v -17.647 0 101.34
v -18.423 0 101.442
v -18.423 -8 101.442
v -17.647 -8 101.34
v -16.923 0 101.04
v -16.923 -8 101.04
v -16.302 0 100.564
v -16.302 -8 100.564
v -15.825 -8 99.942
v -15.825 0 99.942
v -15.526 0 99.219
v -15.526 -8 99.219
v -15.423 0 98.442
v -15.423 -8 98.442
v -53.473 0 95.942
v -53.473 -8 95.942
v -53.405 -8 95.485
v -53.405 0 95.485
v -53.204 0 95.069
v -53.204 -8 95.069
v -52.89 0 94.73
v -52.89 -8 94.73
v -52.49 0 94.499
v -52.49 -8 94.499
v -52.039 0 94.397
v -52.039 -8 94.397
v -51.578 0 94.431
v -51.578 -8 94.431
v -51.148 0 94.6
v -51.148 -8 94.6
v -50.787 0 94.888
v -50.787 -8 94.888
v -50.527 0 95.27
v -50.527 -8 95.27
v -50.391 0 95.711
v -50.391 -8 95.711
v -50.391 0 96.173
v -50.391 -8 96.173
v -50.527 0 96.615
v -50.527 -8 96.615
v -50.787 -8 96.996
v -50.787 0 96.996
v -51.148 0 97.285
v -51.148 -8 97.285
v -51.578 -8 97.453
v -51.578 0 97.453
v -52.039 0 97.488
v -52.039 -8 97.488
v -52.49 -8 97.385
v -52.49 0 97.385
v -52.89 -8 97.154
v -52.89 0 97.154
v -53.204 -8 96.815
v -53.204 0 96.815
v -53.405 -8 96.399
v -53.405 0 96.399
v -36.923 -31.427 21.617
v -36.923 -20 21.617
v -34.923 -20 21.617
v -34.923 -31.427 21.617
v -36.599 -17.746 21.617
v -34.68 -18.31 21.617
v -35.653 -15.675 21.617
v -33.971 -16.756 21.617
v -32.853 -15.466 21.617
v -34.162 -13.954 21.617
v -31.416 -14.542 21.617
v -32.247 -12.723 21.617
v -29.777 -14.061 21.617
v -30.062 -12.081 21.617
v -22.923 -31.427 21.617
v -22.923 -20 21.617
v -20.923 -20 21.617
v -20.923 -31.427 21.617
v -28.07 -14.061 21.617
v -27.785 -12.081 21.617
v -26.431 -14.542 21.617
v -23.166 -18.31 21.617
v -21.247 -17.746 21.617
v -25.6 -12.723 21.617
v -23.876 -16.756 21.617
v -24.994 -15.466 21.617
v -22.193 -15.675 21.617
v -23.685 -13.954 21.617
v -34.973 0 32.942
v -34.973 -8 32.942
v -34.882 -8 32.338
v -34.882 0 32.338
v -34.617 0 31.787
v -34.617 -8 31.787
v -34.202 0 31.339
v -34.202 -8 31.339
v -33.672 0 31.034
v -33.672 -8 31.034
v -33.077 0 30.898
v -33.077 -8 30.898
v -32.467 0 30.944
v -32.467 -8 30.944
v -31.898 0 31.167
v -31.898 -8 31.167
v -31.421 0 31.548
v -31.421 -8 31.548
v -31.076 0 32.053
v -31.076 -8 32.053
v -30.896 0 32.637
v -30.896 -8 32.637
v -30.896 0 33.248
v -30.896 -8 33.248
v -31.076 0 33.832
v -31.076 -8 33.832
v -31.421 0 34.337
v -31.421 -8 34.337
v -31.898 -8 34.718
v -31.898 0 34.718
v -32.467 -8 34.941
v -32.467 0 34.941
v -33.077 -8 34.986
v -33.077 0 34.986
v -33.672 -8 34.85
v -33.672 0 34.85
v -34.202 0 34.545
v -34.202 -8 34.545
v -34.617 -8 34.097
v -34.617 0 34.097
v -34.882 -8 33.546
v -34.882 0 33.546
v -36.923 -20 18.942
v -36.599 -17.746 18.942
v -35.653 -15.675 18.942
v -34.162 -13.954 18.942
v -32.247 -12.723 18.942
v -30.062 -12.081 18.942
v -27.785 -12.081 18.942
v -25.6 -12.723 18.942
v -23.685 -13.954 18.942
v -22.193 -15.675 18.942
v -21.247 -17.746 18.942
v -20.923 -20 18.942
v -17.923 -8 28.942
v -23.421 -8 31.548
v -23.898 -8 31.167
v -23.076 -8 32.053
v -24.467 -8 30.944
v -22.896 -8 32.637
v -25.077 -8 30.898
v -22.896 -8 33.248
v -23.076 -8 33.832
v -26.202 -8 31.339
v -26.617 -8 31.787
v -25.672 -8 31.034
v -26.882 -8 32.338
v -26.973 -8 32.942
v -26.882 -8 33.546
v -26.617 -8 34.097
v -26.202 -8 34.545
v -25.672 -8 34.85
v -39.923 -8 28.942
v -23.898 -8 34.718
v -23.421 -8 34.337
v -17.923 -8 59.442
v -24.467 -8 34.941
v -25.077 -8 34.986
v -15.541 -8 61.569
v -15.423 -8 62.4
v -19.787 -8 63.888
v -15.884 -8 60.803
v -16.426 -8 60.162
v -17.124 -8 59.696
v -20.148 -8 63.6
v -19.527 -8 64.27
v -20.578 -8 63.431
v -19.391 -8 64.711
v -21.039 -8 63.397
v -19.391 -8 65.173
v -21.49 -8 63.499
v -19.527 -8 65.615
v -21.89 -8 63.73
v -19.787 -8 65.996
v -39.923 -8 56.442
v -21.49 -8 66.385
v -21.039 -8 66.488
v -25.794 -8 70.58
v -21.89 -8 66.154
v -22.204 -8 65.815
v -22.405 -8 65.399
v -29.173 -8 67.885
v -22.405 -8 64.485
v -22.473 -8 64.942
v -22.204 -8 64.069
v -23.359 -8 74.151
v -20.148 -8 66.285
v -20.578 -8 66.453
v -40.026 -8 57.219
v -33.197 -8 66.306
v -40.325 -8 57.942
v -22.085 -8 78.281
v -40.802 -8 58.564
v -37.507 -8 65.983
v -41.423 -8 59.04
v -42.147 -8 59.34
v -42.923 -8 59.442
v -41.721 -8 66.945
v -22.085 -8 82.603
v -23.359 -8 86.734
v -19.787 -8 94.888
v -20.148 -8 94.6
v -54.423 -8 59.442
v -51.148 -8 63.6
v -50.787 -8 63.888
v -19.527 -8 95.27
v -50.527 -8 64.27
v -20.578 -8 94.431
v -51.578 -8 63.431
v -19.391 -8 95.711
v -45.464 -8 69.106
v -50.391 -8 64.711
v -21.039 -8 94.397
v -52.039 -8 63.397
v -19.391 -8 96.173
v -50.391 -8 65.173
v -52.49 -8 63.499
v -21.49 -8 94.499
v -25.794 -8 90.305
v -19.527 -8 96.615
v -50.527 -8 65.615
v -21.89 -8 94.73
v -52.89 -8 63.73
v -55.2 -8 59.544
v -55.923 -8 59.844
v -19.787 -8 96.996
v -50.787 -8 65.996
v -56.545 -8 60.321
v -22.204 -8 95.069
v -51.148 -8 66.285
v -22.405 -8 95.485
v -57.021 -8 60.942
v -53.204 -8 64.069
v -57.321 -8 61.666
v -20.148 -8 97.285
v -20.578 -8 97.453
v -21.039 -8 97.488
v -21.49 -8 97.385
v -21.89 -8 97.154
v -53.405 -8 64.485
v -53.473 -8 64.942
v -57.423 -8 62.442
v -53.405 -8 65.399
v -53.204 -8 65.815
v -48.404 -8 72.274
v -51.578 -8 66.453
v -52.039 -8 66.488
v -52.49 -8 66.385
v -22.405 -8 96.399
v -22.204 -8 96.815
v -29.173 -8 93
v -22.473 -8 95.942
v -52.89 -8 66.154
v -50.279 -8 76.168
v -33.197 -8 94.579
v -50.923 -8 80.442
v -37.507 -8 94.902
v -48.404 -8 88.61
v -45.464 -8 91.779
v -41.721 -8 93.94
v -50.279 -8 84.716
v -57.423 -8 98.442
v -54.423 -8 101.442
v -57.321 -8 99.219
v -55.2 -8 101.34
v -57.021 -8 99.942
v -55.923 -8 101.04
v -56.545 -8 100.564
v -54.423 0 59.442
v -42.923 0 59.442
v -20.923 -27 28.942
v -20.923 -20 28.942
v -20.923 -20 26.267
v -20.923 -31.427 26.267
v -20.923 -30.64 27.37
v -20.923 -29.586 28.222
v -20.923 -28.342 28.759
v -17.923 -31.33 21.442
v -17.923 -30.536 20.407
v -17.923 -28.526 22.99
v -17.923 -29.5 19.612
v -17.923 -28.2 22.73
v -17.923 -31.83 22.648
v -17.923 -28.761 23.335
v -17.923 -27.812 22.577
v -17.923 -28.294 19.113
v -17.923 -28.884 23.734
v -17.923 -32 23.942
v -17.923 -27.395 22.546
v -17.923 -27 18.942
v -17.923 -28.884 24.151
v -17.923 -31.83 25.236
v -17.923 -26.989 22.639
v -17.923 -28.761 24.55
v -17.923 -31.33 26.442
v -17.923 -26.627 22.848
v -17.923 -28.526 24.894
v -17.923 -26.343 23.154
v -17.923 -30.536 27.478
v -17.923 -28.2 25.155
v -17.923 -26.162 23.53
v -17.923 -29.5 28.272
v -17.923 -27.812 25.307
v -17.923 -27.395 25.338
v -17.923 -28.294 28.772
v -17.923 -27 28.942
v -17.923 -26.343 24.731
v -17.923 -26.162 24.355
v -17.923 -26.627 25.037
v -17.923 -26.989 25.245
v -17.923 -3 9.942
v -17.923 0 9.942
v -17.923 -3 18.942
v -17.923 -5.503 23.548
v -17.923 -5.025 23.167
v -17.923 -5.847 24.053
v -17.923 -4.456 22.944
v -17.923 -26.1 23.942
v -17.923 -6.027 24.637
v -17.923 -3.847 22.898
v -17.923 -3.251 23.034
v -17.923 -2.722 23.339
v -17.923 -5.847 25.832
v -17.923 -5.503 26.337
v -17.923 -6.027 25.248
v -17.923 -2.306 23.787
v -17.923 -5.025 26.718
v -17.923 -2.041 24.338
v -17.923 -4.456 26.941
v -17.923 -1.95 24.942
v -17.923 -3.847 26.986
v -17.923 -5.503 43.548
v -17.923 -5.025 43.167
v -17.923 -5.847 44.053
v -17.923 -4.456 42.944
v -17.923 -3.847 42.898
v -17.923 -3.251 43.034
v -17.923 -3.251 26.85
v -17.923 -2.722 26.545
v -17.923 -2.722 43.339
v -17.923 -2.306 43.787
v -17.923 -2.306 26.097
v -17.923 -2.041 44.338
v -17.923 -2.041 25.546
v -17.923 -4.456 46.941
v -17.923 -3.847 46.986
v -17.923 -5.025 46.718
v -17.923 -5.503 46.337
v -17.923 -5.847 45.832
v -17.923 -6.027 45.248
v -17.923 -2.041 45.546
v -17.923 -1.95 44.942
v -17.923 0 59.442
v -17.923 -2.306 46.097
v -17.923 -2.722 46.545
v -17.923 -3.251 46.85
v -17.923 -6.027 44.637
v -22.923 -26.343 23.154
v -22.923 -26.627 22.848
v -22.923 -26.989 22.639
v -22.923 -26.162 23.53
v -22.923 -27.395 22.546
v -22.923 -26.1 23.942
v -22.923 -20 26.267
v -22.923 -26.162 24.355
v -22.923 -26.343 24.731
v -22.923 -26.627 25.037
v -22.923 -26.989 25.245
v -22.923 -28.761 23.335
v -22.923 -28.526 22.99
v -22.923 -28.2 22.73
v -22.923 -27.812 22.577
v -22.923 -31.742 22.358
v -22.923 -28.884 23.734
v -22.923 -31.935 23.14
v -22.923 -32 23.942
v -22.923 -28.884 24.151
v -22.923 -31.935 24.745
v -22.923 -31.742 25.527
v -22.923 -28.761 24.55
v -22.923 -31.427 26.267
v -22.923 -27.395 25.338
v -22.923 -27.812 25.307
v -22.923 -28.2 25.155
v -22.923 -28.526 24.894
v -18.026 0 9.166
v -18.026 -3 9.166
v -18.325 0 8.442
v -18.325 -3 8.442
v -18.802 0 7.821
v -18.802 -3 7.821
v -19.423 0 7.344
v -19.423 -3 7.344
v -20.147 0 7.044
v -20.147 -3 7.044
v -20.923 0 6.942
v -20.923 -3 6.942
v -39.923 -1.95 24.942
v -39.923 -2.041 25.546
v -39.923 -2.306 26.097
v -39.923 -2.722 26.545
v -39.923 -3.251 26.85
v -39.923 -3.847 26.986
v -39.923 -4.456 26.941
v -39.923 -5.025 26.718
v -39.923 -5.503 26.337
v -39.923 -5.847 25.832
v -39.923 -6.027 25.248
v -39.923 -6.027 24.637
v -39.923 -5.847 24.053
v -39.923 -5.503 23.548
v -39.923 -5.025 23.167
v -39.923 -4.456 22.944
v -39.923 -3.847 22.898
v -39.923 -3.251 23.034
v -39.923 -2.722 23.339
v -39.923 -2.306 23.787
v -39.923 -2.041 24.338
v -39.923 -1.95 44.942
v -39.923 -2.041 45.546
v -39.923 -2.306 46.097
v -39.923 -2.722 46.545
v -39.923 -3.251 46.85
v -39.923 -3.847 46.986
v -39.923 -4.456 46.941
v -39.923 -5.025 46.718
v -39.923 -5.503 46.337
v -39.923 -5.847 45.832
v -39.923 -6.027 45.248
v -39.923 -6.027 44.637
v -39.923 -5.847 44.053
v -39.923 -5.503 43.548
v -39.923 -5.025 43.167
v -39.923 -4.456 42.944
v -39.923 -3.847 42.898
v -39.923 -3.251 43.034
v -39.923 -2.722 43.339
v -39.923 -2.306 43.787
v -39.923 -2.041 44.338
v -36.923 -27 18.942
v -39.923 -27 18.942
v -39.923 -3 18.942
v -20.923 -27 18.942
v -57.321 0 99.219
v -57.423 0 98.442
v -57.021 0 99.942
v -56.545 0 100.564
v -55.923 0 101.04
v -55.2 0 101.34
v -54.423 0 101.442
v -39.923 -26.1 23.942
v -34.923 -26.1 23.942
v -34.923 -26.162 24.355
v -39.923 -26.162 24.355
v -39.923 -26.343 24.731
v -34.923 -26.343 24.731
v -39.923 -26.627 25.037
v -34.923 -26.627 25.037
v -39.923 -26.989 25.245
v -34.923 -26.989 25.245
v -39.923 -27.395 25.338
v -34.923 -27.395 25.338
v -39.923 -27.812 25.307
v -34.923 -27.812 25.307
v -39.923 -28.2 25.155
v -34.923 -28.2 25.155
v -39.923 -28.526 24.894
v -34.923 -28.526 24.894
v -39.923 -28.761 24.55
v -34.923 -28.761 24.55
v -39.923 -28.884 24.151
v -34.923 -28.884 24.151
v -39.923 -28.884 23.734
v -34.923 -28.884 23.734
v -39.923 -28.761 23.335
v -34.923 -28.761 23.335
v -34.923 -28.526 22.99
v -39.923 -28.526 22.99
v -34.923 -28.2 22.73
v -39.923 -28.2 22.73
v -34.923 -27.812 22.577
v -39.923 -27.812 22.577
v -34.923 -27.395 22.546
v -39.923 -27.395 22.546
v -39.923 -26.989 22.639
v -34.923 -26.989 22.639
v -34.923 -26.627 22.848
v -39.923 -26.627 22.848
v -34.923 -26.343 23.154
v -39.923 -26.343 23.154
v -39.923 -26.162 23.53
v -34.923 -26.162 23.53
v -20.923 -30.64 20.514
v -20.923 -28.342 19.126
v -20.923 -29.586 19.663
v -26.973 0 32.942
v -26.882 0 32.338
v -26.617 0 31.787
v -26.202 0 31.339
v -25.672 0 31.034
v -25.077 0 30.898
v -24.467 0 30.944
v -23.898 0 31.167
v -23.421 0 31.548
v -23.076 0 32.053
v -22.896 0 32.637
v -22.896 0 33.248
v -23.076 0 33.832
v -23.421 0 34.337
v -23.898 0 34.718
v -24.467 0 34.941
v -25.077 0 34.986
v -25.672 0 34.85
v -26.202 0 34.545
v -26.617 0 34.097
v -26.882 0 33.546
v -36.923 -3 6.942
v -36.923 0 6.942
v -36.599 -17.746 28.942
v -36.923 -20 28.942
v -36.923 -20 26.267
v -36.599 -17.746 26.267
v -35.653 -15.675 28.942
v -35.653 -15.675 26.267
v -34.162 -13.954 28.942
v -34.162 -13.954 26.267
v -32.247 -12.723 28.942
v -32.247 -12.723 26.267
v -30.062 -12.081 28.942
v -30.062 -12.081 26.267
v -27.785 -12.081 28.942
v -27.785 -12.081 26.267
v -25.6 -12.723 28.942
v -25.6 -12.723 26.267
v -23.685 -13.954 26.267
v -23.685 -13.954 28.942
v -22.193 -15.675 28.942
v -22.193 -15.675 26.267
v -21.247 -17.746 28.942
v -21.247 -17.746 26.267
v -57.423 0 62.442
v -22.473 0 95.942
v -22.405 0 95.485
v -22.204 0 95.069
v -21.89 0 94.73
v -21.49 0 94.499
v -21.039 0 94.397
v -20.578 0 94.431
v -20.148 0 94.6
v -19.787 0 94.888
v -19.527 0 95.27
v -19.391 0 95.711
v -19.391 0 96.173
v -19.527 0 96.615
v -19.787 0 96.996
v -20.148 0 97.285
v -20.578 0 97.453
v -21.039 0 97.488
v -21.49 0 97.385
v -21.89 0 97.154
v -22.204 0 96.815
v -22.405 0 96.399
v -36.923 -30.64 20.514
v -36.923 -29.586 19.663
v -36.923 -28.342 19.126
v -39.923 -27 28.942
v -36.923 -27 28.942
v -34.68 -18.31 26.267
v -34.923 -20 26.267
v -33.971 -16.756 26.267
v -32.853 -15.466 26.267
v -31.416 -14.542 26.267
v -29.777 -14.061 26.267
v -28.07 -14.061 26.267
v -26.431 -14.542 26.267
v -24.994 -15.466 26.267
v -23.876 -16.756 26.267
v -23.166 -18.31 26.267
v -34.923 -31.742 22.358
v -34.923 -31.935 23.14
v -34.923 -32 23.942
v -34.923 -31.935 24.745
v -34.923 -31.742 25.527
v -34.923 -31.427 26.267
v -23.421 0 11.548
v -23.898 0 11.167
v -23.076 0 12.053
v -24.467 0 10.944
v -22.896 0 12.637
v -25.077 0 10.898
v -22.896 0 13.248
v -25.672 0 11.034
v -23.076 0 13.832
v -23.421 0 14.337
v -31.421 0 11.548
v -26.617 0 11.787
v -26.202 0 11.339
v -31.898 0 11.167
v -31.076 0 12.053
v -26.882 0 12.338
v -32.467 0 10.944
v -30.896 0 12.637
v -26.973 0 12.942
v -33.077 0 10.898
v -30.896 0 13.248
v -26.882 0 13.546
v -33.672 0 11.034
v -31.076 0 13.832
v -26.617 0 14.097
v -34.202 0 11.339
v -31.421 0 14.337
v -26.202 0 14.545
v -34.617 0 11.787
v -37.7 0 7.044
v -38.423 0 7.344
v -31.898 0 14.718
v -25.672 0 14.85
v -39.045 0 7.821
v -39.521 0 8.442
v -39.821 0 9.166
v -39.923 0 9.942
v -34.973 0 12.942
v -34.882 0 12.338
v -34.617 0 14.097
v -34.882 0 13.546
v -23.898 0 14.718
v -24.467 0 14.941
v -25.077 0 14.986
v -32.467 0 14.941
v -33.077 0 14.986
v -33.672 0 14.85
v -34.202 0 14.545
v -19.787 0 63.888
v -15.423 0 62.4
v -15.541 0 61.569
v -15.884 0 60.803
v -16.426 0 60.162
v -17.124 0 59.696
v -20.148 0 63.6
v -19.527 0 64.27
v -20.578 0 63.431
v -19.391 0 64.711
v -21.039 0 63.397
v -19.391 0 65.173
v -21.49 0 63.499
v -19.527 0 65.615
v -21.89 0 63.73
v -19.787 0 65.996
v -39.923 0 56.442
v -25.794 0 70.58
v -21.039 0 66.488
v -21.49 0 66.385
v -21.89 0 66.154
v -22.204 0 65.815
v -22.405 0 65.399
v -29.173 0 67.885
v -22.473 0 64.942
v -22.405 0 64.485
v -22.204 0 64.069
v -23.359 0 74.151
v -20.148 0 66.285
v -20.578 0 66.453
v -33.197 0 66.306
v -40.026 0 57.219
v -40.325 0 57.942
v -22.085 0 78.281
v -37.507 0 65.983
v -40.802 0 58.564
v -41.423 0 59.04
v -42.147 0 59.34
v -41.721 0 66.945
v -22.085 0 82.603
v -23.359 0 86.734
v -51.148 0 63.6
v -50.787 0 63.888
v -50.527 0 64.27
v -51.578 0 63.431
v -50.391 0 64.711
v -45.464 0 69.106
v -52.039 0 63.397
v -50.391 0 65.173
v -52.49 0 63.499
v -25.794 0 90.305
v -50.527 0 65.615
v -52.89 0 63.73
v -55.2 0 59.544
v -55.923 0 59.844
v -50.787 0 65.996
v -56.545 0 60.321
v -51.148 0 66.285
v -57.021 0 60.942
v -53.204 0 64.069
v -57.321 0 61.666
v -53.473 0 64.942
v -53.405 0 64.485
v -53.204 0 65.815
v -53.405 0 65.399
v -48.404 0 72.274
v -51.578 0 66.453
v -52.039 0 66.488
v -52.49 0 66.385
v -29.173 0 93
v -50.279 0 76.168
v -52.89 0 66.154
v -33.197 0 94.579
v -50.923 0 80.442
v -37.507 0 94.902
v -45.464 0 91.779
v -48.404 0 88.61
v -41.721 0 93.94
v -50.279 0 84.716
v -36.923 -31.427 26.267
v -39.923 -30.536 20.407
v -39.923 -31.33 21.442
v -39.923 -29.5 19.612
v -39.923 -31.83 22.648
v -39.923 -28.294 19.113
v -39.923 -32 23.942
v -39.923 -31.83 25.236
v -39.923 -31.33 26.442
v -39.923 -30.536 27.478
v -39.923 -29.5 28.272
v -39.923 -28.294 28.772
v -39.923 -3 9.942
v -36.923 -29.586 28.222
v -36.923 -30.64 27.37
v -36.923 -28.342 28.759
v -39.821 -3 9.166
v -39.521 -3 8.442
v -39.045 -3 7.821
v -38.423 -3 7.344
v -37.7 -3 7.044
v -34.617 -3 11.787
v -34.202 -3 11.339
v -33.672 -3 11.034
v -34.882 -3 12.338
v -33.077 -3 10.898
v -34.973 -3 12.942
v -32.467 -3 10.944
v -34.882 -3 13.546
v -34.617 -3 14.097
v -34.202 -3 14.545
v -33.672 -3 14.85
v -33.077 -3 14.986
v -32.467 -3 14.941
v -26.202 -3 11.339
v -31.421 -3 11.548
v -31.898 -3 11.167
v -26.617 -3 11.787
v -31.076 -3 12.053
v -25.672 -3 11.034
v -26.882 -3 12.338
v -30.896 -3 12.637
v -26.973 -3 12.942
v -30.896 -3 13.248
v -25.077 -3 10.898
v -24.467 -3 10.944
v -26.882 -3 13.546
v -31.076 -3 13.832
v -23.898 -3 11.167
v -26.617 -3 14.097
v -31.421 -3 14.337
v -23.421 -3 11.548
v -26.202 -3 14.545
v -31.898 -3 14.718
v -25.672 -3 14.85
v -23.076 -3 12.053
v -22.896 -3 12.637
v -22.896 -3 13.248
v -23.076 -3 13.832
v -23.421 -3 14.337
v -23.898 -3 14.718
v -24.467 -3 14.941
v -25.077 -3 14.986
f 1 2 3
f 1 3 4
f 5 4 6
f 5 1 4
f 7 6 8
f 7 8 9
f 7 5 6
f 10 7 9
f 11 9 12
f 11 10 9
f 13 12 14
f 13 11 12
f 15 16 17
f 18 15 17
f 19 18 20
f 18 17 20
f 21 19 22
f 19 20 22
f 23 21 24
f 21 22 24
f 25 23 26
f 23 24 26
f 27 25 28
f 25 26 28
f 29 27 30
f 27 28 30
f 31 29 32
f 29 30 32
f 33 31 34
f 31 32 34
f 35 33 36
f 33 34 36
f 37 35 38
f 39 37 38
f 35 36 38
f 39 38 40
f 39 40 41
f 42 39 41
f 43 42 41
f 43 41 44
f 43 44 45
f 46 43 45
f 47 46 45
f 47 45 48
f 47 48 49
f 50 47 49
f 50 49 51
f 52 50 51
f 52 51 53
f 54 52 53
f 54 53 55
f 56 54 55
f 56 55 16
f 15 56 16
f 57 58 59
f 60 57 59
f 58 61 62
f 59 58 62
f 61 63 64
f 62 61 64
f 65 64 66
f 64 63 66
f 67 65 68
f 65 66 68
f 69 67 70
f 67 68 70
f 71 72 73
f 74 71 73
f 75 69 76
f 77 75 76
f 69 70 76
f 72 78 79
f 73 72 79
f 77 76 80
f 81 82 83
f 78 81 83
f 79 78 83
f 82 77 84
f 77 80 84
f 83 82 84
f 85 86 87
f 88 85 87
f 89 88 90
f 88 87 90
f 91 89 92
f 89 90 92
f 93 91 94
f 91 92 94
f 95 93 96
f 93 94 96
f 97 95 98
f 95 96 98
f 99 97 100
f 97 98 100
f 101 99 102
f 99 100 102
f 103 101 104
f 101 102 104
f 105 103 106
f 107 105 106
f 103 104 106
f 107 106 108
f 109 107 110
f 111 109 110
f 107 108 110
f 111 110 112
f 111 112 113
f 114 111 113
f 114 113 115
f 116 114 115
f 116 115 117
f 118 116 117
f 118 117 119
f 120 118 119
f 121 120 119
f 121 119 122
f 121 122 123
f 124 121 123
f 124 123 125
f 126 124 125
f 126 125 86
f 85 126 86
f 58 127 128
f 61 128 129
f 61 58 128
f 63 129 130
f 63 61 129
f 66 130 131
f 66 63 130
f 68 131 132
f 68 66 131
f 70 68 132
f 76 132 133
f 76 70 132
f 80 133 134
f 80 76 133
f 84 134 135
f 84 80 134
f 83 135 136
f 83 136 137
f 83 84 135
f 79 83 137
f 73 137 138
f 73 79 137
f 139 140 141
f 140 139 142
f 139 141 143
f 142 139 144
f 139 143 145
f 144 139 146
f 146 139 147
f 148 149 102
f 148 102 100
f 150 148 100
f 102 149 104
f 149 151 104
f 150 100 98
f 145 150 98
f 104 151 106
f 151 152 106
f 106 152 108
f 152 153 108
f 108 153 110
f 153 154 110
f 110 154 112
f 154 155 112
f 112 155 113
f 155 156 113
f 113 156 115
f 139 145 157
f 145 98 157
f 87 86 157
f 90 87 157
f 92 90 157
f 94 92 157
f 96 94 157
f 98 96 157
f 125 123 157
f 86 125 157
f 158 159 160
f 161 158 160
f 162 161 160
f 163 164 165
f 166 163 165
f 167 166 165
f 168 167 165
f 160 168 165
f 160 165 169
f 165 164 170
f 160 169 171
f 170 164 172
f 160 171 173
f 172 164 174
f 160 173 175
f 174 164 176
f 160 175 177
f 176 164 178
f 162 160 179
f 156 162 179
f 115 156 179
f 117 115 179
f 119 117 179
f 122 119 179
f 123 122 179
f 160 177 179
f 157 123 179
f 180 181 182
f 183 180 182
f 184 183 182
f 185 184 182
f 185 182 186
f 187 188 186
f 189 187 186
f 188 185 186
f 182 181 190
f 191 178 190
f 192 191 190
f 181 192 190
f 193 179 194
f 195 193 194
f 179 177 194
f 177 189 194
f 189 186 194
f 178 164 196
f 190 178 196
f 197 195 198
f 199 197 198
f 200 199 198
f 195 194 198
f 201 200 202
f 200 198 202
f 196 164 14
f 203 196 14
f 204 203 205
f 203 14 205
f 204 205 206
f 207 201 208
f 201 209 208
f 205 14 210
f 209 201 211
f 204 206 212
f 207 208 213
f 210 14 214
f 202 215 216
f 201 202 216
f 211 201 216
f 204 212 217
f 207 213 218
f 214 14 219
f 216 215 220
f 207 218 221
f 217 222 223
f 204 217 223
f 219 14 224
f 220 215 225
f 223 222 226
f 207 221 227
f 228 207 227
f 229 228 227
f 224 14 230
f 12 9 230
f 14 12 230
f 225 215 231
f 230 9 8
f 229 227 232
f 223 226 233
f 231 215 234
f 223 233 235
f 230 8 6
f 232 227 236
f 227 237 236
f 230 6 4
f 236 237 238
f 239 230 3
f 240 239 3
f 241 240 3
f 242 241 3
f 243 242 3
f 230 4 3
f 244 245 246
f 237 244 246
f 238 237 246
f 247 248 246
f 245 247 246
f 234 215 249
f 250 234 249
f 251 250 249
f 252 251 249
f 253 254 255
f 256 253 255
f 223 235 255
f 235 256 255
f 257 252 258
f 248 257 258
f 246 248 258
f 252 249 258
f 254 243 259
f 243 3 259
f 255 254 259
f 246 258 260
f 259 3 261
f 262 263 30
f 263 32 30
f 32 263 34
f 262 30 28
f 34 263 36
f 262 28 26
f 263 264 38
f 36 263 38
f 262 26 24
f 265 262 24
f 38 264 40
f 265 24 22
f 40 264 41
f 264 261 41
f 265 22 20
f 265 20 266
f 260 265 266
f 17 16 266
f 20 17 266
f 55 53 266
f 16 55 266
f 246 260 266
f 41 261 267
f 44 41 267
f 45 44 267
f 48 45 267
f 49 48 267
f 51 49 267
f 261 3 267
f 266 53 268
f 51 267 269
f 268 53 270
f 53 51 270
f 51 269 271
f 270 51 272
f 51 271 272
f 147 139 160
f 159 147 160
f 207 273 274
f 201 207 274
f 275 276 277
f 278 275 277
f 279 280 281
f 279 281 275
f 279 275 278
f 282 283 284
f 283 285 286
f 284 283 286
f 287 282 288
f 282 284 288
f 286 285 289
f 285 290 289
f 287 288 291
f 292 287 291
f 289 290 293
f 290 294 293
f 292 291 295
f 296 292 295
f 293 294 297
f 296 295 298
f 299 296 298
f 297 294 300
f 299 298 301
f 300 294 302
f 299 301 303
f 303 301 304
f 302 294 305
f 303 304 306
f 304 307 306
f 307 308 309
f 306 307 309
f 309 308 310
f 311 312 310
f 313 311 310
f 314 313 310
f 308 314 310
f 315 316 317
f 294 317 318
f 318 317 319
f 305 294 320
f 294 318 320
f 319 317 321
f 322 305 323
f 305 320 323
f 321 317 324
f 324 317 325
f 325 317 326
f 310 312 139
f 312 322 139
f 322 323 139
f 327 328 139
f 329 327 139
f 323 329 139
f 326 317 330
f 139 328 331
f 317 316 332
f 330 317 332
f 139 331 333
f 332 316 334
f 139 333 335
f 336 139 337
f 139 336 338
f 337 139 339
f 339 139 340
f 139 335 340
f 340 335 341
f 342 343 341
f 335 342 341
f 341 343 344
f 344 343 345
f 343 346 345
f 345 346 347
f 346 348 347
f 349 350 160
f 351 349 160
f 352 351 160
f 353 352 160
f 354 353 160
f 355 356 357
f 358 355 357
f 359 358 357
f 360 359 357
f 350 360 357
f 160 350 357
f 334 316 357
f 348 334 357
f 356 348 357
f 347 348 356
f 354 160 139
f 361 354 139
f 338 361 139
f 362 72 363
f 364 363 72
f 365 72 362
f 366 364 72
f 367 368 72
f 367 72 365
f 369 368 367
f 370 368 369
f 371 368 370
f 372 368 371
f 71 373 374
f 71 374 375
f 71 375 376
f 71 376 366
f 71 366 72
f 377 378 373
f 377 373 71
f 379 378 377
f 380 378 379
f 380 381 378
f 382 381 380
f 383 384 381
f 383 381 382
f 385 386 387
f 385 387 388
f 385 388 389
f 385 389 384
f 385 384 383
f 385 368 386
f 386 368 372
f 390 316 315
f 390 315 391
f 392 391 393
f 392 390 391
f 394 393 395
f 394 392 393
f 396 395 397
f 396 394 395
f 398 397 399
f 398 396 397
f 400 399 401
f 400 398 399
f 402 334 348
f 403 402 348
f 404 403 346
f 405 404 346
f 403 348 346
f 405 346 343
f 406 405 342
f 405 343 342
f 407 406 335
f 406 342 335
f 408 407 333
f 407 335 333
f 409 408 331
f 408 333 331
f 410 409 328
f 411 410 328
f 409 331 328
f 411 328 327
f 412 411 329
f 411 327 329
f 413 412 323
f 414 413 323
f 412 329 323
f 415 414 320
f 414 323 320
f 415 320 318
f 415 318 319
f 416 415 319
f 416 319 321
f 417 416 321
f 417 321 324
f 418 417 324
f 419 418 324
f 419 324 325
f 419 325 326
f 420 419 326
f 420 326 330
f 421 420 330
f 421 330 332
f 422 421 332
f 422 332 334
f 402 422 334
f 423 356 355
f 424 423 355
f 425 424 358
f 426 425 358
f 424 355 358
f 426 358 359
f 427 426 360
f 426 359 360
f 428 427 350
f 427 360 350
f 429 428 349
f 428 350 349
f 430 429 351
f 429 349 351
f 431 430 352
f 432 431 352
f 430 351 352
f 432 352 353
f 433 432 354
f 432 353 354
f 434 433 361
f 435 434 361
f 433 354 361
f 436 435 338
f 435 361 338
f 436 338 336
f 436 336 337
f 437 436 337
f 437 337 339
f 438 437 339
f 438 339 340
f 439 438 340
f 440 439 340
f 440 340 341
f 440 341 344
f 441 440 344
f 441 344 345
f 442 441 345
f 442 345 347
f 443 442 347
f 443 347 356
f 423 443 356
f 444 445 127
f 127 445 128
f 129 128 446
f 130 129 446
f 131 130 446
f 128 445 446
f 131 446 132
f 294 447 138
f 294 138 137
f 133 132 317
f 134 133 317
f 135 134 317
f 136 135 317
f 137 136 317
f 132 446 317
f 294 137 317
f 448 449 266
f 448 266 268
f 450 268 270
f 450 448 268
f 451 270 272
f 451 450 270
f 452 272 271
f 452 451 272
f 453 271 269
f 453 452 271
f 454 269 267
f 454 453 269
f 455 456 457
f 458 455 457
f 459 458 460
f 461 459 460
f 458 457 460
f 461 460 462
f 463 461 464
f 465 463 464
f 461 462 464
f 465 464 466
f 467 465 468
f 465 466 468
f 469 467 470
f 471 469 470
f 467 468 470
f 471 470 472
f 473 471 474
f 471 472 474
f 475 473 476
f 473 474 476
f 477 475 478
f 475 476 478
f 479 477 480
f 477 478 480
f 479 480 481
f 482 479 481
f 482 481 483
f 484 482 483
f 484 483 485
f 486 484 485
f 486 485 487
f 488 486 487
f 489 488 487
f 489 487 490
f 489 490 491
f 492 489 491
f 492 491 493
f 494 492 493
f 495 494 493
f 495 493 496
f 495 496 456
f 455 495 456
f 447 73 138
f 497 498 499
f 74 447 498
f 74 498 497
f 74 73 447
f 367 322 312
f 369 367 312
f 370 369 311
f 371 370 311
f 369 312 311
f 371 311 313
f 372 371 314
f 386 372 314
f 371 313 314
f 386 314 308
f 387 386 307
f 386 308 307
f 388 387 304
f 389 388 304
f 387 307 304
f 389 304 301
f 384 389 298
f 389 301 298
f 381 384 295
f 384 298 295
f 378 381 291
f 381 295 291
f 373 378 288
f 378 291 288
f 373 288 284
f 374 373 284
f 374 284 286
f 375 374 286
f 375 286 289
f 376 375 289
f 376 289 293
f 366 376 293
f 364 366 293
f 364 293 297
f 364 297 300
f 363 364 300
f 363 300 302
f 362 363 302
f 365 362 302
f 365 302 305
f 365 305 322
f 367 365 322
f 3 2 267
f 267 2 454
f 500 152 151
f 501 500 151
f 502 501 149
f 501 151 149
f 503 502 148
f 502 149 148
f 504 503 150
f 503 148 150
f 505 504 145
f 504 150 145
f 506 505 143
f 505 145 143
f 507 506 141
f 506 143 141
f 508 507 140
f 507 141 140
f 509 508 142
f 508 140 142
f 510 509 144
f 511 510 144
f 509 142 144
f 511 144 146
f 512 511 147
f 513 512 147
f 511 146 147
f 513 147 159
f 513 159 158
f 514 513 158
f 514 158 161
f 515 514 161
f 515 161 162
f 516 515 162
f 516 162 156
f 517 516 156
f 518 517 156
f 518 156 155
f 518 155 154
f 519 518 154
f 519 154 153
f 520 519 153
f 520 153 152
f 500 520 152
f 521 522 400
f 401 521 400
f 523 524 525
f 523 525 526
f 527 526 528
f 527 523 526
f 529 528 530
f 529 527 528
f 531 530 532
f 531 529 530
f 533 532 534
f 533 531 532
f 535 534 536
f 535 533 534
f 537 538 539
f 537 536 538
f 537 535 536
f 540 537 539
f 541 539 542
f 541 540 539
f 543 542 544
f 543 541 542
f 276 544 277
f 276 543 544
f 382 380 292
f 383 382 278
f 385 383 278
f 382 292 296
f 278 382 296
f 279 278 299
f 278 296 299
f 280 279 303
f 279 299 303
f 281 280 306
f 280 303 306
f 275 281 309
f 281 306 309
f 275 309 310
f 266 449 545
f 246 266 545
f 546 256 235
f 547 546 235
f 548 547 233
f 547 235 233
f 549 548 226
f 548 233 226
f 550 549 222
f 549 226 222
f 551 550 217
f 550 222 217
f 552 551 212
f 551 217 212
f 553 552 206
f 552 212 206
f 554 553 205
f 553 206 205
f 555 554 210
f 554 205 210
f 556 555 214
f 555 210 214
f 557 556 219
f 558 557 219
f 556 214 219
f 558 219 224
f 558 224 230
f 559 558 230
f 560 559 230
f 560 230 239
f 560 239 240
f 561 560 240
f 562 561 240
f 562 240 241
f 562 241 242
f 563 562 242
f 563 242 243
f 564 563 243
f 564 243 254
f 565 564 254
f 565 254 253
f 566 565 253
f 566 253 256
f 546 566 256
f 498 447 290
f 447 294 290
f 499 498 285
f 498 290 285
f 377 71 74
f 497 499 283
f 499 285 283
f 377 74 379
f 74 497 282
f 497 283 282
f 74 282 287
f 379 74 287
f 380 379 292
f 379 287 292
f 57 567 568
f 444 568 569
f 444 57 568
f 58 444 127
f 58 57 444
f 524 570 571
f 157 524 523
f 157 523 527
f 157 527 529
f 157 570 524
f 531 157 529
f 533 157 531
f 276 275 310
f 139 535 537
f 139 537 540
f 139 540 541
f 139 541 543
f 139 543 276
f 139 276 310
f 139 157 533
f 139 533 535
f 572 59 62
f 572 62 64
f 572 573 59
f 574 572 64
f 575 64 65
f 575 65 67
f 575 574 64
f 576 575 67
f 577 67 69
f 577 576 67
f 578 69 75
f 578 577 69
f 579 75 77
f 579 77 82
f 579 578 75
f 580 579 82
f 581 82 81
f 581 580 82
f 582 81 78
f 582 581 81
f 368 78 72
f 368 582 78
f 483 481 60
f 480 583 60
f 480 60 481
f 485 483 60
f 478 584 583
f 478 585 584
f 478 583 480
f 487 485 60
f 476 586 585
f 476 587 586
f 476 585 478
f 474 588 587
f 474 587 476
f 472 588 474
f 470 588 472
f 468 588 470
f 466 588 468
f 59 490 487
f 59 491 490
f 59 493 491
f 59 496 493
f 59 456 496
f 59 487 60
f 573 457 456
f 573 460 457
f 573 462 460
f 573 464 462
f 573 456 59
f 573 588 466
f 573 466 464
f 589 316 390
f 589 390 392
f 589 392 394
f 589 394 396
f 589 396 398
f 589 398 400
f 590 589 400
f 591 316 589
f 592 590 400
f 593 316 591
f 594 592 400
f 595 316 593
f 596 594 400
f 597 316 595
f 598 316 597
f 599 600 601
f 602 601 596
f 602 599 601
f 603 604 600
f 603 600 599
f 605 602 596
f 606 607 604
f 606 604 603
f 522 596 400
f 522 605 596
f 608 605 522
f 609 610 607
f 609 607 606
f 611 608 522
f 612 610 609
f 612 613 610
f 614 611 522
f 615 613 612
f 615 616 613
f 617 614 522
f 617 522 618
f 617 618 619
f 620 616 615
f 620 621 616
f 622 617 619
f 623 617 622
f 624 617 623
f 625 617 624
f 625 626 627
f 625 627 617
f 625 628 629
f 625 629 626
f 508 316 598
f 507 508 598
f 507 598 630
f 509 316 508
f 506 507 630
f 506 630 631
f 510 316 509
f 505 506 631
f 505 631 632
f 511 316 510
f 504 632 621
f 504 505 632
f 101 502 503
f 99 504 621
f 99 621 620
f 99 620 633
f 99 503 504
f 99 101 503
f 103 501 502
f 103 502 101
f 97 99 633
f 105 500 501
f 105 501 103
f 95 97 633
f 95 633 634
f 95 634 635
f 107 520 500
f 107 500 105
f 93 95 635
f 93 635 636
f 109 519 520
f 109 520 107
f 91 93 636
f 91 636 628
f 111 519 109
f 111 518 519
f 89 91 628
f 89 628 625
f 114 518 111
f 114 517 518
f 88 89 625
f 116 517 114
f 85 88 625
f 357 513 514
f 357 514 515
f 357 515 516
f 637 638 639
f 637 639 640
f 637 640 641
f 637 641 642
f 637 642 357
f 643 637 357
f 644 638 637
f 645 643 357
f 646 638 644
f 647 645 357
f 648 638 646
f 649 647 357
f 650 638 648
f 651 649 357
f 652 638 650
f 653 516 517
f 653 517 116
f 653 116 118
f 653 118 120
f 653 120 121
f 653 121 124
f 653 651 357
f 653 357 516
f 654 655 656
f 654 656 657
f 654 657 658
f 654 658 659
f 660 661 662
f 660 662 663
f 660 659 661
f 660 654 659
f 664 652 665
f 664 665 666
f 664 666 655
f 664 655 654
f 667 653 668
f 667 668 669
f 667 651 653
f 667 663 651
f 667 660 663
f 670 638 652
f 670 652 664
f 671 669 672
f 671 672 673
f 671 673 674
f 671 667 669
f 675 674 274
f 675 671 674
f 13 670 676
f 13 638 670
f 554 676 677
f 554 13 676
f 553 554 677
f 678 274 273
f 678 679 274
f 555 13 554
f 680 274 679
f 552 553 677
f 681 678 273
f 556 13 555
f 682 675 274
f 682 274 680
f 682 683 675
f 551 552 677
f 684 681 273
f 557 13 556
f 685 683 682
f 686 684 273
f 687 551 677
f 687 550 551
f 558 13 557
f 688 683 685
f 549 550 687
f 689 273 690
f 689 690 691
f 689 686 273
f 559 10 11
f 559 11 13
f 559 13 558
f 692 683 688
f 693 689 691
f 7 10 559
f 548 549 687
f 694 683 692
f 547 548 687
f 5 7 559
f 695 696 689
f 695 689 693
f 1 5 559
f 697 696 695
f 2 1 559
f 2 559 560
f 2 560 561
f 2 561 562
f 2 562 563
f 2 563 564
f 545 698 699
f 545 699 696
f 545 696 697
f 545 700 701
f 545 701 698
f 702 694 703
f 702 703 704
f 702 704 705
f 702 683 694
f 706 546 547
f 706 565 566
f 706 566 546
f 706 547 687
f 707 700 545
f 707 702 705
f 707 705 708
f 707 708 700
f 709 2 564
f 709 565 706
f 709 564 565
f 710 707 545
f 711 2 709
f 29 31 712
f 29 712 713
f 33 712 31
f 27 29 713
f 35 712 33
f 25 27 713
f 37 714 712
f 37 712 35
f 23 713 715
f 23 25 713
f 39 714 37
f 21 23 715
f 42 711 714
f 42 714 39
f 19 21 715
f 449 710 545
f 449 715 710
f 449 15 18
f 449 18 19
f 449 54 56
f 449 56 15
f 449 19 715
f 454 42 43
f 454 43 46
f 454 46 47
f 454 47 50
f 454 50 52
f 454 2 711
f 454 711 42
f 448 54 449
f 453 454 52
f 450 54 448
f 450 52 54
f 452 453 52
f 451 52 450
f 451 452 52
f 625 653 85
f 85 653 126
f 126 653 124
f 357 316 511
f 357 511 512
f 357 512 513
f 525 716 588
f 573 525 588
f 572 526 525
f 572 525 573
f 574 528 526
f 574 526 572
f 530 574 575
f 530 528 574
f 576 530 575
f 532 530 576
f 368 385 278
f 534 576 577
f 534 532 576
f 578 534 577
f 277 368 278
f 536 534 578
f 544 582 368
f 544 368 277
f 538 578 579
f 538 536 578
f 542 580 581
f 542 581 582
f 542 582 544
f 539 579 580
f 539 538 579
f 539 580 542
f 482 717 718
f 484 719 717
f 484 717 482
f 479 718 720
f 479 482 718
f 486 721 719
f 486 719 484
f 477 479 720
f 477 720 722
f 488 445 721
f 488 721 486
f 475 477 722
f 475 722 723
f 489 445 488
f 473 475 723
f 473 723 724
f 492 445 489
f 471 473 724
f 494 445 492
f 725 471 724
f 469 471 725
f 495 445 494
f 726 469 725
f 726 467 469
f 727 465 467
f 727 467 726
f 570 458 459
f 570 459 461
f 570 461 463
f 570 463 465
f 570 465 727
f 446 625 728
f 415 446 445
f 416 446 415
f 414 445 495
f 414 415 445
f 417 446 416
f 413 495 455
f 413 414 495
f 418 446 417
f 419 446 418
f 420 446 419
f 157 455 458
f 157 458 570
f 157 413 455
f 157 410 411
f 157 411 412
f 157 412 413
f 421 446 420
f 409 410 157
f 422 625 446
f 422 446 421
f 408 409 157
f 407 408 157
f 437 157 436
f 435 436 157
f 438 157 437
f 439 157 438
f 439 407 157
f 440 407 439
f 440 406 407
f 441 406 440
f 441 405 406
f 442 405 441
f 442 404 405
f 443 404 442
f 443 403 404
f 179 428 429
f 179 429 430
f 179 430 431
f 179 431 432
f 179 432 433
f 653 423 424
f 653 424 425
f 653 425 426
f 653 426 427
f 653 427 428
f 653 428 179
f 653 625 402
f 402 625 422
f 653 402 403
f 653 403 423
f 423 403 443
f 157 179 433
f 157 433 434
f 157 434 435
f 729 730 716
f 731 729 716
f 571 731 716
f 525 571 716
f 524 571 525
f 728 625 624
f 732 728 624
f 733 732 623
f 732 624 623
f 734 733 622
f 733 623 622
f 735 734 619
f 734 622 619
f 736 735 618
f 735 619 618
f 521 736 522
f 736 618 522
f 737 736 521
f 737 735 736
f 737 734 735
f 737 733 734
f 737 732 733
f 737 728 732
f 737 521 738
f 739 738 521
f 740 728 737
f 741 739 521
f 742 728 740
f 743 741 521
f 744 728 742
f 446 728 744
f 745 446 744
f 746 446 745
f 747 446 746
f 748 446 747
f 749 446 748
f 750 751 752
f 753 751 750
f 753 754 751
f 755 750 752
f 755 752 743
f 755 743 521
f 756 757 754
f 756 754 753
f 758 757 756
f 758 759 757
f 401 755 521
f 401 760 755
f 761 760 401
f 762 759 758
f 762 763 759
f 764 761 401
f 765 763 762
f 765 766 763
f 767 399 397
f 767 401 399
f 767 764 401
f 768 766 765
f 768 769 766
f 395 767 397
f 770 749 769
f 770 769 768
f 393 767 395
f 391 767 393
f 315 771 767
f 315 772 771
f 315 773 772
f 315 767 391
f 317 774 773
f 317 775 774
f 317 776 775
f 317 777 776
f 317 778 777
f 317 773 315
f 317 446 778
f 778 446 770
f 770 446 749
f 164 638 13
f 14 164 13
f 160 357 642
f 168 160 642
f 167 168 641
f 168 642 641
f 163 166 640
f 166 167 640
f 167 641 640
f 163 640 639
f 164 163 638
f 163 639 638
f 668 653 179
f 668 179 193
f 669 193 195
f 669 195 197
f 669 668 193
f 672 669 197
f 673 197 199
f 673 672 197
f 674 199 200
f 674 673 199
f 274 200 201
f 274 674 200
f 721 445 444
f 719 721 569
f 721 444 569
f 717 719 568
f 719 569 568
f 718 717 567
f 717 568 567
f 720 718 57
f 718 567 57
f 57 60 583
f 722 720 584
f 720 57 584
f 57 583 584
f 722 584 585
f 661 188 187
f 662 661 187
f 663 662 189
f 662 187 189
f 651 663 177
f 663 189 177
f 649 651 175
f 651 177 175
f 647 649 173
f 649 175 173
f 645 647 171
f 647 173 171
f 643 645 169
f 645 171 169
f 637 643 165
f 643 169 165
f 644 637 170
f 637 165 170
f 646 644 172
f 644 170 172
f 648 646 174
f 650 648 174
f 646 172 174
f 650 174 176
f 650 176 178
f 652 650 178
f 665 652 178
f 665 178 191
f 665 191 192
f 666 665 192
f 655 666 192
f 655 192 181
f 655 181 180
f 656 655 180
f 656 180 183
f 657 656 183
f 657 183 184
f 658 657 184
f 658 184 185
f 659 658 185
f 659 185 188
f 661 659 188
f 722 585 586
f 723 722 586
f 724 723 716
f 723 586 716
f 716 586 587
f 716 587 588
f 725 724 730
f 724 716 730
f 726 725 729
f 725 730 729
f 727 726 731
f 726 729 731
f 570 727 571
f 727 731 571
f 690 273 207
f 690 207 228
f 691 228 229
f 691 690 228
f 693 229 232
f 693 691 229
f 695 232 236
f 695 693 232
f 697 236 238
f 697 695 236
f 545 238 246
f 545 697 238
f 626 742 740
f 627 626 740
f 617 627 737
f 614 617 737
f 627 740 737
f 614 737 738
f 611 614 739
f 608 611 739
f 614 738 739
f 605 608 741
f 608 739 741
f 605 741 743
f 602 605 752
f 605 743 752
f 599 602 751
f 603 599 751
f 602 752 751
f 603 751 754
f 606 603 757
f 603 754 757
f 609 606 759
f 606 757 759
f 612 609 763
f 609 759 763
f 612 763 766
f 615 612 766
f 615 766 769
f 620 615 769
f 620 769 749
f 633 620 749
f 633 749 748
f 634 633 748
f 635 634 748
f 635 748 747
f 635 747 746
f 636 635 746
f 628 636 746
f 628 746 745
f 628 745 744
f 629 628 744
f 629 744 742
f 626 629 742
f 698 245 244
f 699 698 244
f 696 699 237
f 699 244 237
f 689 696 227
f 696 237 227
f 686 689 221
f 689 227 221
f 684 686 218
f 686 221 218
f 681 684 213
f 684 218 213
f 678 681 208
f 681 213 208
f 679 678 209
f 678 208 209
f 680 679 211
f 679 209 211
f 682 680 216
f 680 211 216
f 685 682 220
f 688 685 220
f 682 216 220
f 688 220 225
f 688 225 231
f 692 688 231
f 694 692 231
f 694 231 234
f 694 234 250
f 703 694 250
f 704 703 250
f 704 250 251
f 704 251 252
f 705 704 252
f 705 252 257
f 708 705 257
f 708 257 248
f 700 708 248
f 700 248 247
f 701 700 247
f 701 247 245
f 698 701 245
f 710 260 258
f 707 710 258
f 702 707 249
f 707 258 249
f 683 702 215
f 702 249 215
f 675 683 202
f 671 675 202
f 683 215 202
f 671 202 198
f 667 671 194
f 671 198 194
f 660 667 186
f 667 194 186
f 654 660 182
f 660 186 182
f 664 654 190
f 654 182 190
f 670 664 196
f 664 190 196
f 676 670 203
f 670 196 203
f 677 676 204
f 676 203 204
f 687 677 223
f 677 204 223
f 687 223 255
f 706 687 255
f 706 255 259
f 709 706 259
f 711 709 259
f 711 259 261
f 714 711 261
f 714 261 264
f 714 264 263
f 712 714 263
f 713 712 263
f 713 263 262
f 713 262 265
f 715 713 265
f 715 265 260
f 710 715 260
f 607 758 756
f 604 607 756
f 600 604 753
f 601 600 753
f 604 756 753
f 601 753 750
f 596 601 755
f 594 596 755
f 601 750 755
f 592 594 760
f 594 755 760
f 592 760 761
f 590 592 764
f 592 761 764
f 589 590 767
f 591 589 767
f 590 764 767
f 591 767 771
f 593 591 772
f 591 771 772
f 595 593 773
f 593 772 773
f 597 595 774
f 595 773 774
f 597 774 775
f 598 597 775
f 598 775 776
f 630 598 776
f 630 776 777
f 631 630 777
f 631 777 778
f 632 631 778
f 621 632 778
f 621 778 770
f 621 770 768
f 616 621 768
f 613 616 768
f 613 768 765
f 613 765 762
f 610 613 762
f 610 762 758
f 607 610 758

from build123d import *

# Parameters (mm, degrees)
F0_W          = 22
F0_H          = 42
F1_DEPTH      = 3
F2_W          = 3
F2_H          = 30
F2_W_2        = 5
F3_DEPTH      = 22
F4_D          = 4.1
F7_DEPTH      = 5
F8_DEPTH      = 2.325
F9_R          = 4.99999
F11_D         = 4.1
F12_D         = 2.8
F13_W         = 22
F13_H         = 10.5
F14_DEPTH     = 8
F15_T1_DEPTH  = 8
F15_T3_DEPTH  = 18
F15_T5_DEPTH  = 18
F15_T7_DEPTH  = 22.7901994578
F15_T9_DEPTH  = 23
F15_T11_DEPTH = 23
F15_T13_DEPTH = 23
F16_D         = 29
F17_D         = 3.1


# Not quite as in the source:
# - a fillet or chamfer that OpenCascade refuses, or shapes differently, is made with other operations: its cross-section is extruded or revolved along the edge and cut away or added
# - a fillet or chamfer is up to 0.001 mm smaller than in the source, because OpenCascade refuses the exact size


with BuildPart() as f1:
    # F0 (on Front) → F1 (new body)
    with BuildSketch(Plane.XZ):
        with Locations((-28.9233987555, 27.9422005266)):
            Rectangle(F0_W, F0_H)
    extrude(amount=F1_DEPTH)

    # F2 (on face) → F3 (join)
    with BuildSketch(Plane(origin=(-39.9233987555, 0, 0), x_dir=(0, -1, 0), z_dir=(-1, 0, 0))):
        with Locations((1.5, 33.9422005266)):
            Rectangle(F2_W, F2_H)
        with Locations((5.5, 33.9422005266)):
            Rectangle(F2_W_2, F2_H)
    extrude(amount=-F3_DEPTH)

    # F4 (through all)
    with Locations(Plane(origin=(0, 0, 0), x_dir=(1, 0, 0), z_dir=(0, 1, 0))):
        with Locations((-24.9233987555, -12.9422005266), (-32.9233987555, -12.9422005266), (-32.9233987555, -32.9422005266), (-24.9233987555, -32.9422005266)):
            Hole(F4_D / 2)

    # F6 (on line) → F7 (join, symmetric)
    with BuildSketch(Plane.XY.offset(23.9422005266)):
        with BuildLine():
            ThreePointArc((-36.9233987555, -20), (-28.9233987555, -12), (-20.9233987555, -20))
            Line((-20.9233987555, -20), (-20.9233987555, -32))
            Line((-20.9233987555, -32), (-17.9233987555, -32))
            Line((-17.9233987555, -32), (-17.9233987555, 0))
            Line((-17.9233987555, 0), (-39.9233987555, 0))
            Line((-39.9233987555, 0), (-39.9233987555, -32))
            Line((-39.9233987555, -32), (-36.9233987555, -32))
            Line((-36.9233987555, -32), (-36.9233987555, -20))
        make_face()
    extrude(amount=F7_DEPTH, both=True)

    # F6 (on line) → F8 (join, symmetric)
    with BuildSketch(Plane.XY.offset(23.9422005266)):
        with BuildLine():
            ThreePointArc((-34.9233987555, -20), (-28.9233987555, -14), (-22.9233987555, -20))
            Line((-22.9233987555, -20), (-22.9233987555, -25.2915026221))
            ThreePointArc((-22.9233987555, -25.2915026221), (-21.4400839819, -22.8284271247), (-20.9233987555, -20))
            ThreePointArc((-20.9233987555, -20), (-28.9233987555, -12), (-36.9233987555, -20))
            ThreePointArc((-36.9233987555, -20), (-36.406713529, -22.8284271247), (-34.9233987555, -25.2915026221))
            Line((-34.9233987555, -25.2915026221), (-34.9233987555, -20))
        make_face()
        with BuildLine():
            Line((-34.9233987555, -32), (-34.9233987555, -25.2915026221))
            ThreePointArc((-34.9233987555, -25.2915026221), (-36.406713529, -22.8284271247), (-36.9233987555, -20))
            Line((-36.9233987555, -20), (-36.9233987555, -32))
            Line((-36.9233987555, -32), (-34.9233987555, -32))
        make_face()
        with BuildLine():
            ThreePointArc((-20.9233987555, -20), (-21.4400839819, -22.8284271247), (-22.9233987555, -25.2915026221))
            Line((-22.9233987555, -25.2915026221), (-22.9233987555, -32))
            Line((-22.9233987555, -32), (-20.9233987555, -32))
            Line((-20.9233987555, -32), (-20.9233987555, -20))
        make_face()
    extrude(amount=F8_DEPTH, both=True)

    # F9 (radius 5 in the source; OpenCascade refuses exactly that, so slightly less here)
    f9_edges = [f1.edges().sort_by_distance(p)[0] for p in [
        (-38.423399, -32, 28.942201),
        (-38.423399, -32, 18.942201),
        (-19.423399, -32, 18.942201),
        (-19.423399, -32, 28.942201),
    ]]
    fillet(f9_edges, radius=F9_R)

    # F11 (through all)
    with Locations(Plane(origin=(-39.9233987555, 0, 0), x_dir=(0, -1, 0), z_dir=(-1, 0, 0))):
        with Locations((4, 44.9422005266), (4, 24.9422005266)):
            Hole(F11_D / 2)

    # F12 (through all)
    with Locations(Plane(origin=(-39.9233987555, 0, 0), x_dir=(0, -1, 0), z_dir=(-1, 0, 0))):
        with Locations((27.5, 23.9422005266)):
            Hole(F12_D / 2)

    # F13 (on Front) → F14 (join)
    with BuildSketch(Plane.XZ):
        Polygon((-57.4233987555, 59.4422005266), (-39.9233987555, 59.4422005266), (-17.9233987555, 59.4422005266), (-15.4233987555, 59.4422005266), (-15.4233987555, 101.4422005266), (-57.4233987555, 101.4422005266), align=None)
        with Locations((-28.9233987555, 54.1922005266)):
            Rectangle(F13_W, F13_H)
    extrude(amount=F14_DEPTH)

    # F15: fillet of radius 3 on 7 edges, made by hand

    # F15_s2 → F15_t1 (join)
    with BuildSketch(Plane.XZ):
        with BuildLine():
            ThreePointArc((-39.9233987555, 56.4422005266), (-40.8020784119, 58.5635208702), (-42.9233987555, 59.4422005266))
            Line((-42.9233987555, 59.4422005266), (-39.9233987555, 59.4422005266))
            Line((-39.9233987555, 59.4422005266), (-39.9233987555, 56.4422005266))
        make_face()
    extrude(amount=F15_T1_DEPTH)

    # F15_s4 → F15_t3 (cut)
    with BuildSketch(Plane.XZ.offset(-7.5)):
        with BuildLine():
            ThreePointArc((-39.9233987555, 9.9422005266), (-39.0447190991, 7.820880183), (-36.9233987555, 6.9422005266))
            Line((-36.9233987555, 6.9422005266), (-39.9233987555, 6.9422005266))
            Line((-39.9233987555, 6.9422005266), (-39.9233987555, 9.9422005266))
        make_face()
    extrude(amount=F15_T3_DEPTH, mode=Mode.SUBTRACT)

    # F15_s6 → F15_t5 (cut)
    with BuildSketch(Plane.XZ.offset(-7.5)):
        with BuildLine():
            ThreePointArc((-17.9233987555, 9.9422005266), (-18.8020784119, 7.820880183), (-20.9233987555, 6.9422005266))
            Line((-20.9233987555, 6.9422005266), (-17.9233987555, 6.9422005266))
            Line((-17.9233987555, 6.9422005266), (-17.9233987555, 9.9422005266))
        make_face()
    extrude(amount=F15_T5_DEPTH, mode=Mode.SUBTRACT)

    # F15_s8 → F15_t7 (cut)
    with BuildSketch(Plane.XZ.offset(-7.3950997289)):
        with BuildLine():
            ThreePointArc((-17.9233987555, 59.4422005266), (-16.132110908, 60.463748745), (-15.4233987555, 62.4002404181))
            Line((-15.4233987555, 62.4002404181), (-15.4233987555, 59.4422005266))
            Line((-15.4233987555, 59.4422005266), (-17.9233987555, 59.4422005266))
        make_face()
    extrude(amount=F15_T7_DEPTH, mode=Mode.SUBTRACT)

    # F15_s10 → F15_t9 (cut)
    with BuildSketch(Plane.XZ.offset(-7.5)):
        with BuildLine():
            ThreePointArc((-18.4233987555, 101.4422005266), (-16.3020784119, 100.5635208702), (-15.4233987555, 98.4422005266))
            Line((-15.4233987555, 98.4422005266), (-15.4233987555, 101.4422005266))
            Line((-15.4233987555, 101.4422005266), (-18.4233987555, 101.4422005266))
        make_face()
    extrude(amount=F15_T9_DEPTH, mode=Mode.SUBTRACT)

    # F15_s12 → F15_t11 (cut)
    with BuildSketch(Plane.XZ.offset(-7.5)):
        with BuildLine():
            ThreePointArc((-57.4233987555, 98.4422005266), (-56.5447190991, 100.5635208702), (-54.4233987555, 101.4422005266))
            Line((-54.4233987555, 101.4422005266), (-57.4233987555, 101.4422005266))
            Line((-57.4233987555, 101.4422005266), (-57.4233987555, 98.4422005266))
        make_face()
    extrude(amount=F15_T11_DEPTH, mode=Mode.SUBTRACT)

    # F15_s14 → F15_t13 (cut)
    with BuildSketch(Plane.XZ.offset(-7.5)):
        with BuildLine():
            ThreePointArc((-54.4233987555, 59.4422005266), (-56.5447190991, 60.320880183), (-57.4233987555, 62.4422005266))
            Line((-57.4233987555, 62.4422005266), (-57.4233987555, 59.4422005266))
            Line((-57.4233987555, 59.4422005266), (-54.4233987555, 59.4422005266))
        make_face()
    extrude(amount=F15_T13_DEPTH, mode=Mode.SUBTRACT)

    # F16 (through all)
    with Locations(Plane(origin=(0, 0, 0), x_dir=(1, 0, 0), z_dir=(0, 1, 0))):
        with Locations((-36.4233987555, -80.4422005266)):
            Hole(F16_D / 2)

    # F17 (through all)
    with Locations(Plane(origin=(0, 0, 0), x_dir=(1, 0, 0), z_dir=(0, 1, 0))):
        with Locations((-51.9233987555, -95.9422005266), (-20.9233987555, -95.9422005266), (-20.9233987555, -64.9422005266), (-51.9233987555, -64.9422005266)):
            Hole(F17_D / 2)


solid = f1.part
